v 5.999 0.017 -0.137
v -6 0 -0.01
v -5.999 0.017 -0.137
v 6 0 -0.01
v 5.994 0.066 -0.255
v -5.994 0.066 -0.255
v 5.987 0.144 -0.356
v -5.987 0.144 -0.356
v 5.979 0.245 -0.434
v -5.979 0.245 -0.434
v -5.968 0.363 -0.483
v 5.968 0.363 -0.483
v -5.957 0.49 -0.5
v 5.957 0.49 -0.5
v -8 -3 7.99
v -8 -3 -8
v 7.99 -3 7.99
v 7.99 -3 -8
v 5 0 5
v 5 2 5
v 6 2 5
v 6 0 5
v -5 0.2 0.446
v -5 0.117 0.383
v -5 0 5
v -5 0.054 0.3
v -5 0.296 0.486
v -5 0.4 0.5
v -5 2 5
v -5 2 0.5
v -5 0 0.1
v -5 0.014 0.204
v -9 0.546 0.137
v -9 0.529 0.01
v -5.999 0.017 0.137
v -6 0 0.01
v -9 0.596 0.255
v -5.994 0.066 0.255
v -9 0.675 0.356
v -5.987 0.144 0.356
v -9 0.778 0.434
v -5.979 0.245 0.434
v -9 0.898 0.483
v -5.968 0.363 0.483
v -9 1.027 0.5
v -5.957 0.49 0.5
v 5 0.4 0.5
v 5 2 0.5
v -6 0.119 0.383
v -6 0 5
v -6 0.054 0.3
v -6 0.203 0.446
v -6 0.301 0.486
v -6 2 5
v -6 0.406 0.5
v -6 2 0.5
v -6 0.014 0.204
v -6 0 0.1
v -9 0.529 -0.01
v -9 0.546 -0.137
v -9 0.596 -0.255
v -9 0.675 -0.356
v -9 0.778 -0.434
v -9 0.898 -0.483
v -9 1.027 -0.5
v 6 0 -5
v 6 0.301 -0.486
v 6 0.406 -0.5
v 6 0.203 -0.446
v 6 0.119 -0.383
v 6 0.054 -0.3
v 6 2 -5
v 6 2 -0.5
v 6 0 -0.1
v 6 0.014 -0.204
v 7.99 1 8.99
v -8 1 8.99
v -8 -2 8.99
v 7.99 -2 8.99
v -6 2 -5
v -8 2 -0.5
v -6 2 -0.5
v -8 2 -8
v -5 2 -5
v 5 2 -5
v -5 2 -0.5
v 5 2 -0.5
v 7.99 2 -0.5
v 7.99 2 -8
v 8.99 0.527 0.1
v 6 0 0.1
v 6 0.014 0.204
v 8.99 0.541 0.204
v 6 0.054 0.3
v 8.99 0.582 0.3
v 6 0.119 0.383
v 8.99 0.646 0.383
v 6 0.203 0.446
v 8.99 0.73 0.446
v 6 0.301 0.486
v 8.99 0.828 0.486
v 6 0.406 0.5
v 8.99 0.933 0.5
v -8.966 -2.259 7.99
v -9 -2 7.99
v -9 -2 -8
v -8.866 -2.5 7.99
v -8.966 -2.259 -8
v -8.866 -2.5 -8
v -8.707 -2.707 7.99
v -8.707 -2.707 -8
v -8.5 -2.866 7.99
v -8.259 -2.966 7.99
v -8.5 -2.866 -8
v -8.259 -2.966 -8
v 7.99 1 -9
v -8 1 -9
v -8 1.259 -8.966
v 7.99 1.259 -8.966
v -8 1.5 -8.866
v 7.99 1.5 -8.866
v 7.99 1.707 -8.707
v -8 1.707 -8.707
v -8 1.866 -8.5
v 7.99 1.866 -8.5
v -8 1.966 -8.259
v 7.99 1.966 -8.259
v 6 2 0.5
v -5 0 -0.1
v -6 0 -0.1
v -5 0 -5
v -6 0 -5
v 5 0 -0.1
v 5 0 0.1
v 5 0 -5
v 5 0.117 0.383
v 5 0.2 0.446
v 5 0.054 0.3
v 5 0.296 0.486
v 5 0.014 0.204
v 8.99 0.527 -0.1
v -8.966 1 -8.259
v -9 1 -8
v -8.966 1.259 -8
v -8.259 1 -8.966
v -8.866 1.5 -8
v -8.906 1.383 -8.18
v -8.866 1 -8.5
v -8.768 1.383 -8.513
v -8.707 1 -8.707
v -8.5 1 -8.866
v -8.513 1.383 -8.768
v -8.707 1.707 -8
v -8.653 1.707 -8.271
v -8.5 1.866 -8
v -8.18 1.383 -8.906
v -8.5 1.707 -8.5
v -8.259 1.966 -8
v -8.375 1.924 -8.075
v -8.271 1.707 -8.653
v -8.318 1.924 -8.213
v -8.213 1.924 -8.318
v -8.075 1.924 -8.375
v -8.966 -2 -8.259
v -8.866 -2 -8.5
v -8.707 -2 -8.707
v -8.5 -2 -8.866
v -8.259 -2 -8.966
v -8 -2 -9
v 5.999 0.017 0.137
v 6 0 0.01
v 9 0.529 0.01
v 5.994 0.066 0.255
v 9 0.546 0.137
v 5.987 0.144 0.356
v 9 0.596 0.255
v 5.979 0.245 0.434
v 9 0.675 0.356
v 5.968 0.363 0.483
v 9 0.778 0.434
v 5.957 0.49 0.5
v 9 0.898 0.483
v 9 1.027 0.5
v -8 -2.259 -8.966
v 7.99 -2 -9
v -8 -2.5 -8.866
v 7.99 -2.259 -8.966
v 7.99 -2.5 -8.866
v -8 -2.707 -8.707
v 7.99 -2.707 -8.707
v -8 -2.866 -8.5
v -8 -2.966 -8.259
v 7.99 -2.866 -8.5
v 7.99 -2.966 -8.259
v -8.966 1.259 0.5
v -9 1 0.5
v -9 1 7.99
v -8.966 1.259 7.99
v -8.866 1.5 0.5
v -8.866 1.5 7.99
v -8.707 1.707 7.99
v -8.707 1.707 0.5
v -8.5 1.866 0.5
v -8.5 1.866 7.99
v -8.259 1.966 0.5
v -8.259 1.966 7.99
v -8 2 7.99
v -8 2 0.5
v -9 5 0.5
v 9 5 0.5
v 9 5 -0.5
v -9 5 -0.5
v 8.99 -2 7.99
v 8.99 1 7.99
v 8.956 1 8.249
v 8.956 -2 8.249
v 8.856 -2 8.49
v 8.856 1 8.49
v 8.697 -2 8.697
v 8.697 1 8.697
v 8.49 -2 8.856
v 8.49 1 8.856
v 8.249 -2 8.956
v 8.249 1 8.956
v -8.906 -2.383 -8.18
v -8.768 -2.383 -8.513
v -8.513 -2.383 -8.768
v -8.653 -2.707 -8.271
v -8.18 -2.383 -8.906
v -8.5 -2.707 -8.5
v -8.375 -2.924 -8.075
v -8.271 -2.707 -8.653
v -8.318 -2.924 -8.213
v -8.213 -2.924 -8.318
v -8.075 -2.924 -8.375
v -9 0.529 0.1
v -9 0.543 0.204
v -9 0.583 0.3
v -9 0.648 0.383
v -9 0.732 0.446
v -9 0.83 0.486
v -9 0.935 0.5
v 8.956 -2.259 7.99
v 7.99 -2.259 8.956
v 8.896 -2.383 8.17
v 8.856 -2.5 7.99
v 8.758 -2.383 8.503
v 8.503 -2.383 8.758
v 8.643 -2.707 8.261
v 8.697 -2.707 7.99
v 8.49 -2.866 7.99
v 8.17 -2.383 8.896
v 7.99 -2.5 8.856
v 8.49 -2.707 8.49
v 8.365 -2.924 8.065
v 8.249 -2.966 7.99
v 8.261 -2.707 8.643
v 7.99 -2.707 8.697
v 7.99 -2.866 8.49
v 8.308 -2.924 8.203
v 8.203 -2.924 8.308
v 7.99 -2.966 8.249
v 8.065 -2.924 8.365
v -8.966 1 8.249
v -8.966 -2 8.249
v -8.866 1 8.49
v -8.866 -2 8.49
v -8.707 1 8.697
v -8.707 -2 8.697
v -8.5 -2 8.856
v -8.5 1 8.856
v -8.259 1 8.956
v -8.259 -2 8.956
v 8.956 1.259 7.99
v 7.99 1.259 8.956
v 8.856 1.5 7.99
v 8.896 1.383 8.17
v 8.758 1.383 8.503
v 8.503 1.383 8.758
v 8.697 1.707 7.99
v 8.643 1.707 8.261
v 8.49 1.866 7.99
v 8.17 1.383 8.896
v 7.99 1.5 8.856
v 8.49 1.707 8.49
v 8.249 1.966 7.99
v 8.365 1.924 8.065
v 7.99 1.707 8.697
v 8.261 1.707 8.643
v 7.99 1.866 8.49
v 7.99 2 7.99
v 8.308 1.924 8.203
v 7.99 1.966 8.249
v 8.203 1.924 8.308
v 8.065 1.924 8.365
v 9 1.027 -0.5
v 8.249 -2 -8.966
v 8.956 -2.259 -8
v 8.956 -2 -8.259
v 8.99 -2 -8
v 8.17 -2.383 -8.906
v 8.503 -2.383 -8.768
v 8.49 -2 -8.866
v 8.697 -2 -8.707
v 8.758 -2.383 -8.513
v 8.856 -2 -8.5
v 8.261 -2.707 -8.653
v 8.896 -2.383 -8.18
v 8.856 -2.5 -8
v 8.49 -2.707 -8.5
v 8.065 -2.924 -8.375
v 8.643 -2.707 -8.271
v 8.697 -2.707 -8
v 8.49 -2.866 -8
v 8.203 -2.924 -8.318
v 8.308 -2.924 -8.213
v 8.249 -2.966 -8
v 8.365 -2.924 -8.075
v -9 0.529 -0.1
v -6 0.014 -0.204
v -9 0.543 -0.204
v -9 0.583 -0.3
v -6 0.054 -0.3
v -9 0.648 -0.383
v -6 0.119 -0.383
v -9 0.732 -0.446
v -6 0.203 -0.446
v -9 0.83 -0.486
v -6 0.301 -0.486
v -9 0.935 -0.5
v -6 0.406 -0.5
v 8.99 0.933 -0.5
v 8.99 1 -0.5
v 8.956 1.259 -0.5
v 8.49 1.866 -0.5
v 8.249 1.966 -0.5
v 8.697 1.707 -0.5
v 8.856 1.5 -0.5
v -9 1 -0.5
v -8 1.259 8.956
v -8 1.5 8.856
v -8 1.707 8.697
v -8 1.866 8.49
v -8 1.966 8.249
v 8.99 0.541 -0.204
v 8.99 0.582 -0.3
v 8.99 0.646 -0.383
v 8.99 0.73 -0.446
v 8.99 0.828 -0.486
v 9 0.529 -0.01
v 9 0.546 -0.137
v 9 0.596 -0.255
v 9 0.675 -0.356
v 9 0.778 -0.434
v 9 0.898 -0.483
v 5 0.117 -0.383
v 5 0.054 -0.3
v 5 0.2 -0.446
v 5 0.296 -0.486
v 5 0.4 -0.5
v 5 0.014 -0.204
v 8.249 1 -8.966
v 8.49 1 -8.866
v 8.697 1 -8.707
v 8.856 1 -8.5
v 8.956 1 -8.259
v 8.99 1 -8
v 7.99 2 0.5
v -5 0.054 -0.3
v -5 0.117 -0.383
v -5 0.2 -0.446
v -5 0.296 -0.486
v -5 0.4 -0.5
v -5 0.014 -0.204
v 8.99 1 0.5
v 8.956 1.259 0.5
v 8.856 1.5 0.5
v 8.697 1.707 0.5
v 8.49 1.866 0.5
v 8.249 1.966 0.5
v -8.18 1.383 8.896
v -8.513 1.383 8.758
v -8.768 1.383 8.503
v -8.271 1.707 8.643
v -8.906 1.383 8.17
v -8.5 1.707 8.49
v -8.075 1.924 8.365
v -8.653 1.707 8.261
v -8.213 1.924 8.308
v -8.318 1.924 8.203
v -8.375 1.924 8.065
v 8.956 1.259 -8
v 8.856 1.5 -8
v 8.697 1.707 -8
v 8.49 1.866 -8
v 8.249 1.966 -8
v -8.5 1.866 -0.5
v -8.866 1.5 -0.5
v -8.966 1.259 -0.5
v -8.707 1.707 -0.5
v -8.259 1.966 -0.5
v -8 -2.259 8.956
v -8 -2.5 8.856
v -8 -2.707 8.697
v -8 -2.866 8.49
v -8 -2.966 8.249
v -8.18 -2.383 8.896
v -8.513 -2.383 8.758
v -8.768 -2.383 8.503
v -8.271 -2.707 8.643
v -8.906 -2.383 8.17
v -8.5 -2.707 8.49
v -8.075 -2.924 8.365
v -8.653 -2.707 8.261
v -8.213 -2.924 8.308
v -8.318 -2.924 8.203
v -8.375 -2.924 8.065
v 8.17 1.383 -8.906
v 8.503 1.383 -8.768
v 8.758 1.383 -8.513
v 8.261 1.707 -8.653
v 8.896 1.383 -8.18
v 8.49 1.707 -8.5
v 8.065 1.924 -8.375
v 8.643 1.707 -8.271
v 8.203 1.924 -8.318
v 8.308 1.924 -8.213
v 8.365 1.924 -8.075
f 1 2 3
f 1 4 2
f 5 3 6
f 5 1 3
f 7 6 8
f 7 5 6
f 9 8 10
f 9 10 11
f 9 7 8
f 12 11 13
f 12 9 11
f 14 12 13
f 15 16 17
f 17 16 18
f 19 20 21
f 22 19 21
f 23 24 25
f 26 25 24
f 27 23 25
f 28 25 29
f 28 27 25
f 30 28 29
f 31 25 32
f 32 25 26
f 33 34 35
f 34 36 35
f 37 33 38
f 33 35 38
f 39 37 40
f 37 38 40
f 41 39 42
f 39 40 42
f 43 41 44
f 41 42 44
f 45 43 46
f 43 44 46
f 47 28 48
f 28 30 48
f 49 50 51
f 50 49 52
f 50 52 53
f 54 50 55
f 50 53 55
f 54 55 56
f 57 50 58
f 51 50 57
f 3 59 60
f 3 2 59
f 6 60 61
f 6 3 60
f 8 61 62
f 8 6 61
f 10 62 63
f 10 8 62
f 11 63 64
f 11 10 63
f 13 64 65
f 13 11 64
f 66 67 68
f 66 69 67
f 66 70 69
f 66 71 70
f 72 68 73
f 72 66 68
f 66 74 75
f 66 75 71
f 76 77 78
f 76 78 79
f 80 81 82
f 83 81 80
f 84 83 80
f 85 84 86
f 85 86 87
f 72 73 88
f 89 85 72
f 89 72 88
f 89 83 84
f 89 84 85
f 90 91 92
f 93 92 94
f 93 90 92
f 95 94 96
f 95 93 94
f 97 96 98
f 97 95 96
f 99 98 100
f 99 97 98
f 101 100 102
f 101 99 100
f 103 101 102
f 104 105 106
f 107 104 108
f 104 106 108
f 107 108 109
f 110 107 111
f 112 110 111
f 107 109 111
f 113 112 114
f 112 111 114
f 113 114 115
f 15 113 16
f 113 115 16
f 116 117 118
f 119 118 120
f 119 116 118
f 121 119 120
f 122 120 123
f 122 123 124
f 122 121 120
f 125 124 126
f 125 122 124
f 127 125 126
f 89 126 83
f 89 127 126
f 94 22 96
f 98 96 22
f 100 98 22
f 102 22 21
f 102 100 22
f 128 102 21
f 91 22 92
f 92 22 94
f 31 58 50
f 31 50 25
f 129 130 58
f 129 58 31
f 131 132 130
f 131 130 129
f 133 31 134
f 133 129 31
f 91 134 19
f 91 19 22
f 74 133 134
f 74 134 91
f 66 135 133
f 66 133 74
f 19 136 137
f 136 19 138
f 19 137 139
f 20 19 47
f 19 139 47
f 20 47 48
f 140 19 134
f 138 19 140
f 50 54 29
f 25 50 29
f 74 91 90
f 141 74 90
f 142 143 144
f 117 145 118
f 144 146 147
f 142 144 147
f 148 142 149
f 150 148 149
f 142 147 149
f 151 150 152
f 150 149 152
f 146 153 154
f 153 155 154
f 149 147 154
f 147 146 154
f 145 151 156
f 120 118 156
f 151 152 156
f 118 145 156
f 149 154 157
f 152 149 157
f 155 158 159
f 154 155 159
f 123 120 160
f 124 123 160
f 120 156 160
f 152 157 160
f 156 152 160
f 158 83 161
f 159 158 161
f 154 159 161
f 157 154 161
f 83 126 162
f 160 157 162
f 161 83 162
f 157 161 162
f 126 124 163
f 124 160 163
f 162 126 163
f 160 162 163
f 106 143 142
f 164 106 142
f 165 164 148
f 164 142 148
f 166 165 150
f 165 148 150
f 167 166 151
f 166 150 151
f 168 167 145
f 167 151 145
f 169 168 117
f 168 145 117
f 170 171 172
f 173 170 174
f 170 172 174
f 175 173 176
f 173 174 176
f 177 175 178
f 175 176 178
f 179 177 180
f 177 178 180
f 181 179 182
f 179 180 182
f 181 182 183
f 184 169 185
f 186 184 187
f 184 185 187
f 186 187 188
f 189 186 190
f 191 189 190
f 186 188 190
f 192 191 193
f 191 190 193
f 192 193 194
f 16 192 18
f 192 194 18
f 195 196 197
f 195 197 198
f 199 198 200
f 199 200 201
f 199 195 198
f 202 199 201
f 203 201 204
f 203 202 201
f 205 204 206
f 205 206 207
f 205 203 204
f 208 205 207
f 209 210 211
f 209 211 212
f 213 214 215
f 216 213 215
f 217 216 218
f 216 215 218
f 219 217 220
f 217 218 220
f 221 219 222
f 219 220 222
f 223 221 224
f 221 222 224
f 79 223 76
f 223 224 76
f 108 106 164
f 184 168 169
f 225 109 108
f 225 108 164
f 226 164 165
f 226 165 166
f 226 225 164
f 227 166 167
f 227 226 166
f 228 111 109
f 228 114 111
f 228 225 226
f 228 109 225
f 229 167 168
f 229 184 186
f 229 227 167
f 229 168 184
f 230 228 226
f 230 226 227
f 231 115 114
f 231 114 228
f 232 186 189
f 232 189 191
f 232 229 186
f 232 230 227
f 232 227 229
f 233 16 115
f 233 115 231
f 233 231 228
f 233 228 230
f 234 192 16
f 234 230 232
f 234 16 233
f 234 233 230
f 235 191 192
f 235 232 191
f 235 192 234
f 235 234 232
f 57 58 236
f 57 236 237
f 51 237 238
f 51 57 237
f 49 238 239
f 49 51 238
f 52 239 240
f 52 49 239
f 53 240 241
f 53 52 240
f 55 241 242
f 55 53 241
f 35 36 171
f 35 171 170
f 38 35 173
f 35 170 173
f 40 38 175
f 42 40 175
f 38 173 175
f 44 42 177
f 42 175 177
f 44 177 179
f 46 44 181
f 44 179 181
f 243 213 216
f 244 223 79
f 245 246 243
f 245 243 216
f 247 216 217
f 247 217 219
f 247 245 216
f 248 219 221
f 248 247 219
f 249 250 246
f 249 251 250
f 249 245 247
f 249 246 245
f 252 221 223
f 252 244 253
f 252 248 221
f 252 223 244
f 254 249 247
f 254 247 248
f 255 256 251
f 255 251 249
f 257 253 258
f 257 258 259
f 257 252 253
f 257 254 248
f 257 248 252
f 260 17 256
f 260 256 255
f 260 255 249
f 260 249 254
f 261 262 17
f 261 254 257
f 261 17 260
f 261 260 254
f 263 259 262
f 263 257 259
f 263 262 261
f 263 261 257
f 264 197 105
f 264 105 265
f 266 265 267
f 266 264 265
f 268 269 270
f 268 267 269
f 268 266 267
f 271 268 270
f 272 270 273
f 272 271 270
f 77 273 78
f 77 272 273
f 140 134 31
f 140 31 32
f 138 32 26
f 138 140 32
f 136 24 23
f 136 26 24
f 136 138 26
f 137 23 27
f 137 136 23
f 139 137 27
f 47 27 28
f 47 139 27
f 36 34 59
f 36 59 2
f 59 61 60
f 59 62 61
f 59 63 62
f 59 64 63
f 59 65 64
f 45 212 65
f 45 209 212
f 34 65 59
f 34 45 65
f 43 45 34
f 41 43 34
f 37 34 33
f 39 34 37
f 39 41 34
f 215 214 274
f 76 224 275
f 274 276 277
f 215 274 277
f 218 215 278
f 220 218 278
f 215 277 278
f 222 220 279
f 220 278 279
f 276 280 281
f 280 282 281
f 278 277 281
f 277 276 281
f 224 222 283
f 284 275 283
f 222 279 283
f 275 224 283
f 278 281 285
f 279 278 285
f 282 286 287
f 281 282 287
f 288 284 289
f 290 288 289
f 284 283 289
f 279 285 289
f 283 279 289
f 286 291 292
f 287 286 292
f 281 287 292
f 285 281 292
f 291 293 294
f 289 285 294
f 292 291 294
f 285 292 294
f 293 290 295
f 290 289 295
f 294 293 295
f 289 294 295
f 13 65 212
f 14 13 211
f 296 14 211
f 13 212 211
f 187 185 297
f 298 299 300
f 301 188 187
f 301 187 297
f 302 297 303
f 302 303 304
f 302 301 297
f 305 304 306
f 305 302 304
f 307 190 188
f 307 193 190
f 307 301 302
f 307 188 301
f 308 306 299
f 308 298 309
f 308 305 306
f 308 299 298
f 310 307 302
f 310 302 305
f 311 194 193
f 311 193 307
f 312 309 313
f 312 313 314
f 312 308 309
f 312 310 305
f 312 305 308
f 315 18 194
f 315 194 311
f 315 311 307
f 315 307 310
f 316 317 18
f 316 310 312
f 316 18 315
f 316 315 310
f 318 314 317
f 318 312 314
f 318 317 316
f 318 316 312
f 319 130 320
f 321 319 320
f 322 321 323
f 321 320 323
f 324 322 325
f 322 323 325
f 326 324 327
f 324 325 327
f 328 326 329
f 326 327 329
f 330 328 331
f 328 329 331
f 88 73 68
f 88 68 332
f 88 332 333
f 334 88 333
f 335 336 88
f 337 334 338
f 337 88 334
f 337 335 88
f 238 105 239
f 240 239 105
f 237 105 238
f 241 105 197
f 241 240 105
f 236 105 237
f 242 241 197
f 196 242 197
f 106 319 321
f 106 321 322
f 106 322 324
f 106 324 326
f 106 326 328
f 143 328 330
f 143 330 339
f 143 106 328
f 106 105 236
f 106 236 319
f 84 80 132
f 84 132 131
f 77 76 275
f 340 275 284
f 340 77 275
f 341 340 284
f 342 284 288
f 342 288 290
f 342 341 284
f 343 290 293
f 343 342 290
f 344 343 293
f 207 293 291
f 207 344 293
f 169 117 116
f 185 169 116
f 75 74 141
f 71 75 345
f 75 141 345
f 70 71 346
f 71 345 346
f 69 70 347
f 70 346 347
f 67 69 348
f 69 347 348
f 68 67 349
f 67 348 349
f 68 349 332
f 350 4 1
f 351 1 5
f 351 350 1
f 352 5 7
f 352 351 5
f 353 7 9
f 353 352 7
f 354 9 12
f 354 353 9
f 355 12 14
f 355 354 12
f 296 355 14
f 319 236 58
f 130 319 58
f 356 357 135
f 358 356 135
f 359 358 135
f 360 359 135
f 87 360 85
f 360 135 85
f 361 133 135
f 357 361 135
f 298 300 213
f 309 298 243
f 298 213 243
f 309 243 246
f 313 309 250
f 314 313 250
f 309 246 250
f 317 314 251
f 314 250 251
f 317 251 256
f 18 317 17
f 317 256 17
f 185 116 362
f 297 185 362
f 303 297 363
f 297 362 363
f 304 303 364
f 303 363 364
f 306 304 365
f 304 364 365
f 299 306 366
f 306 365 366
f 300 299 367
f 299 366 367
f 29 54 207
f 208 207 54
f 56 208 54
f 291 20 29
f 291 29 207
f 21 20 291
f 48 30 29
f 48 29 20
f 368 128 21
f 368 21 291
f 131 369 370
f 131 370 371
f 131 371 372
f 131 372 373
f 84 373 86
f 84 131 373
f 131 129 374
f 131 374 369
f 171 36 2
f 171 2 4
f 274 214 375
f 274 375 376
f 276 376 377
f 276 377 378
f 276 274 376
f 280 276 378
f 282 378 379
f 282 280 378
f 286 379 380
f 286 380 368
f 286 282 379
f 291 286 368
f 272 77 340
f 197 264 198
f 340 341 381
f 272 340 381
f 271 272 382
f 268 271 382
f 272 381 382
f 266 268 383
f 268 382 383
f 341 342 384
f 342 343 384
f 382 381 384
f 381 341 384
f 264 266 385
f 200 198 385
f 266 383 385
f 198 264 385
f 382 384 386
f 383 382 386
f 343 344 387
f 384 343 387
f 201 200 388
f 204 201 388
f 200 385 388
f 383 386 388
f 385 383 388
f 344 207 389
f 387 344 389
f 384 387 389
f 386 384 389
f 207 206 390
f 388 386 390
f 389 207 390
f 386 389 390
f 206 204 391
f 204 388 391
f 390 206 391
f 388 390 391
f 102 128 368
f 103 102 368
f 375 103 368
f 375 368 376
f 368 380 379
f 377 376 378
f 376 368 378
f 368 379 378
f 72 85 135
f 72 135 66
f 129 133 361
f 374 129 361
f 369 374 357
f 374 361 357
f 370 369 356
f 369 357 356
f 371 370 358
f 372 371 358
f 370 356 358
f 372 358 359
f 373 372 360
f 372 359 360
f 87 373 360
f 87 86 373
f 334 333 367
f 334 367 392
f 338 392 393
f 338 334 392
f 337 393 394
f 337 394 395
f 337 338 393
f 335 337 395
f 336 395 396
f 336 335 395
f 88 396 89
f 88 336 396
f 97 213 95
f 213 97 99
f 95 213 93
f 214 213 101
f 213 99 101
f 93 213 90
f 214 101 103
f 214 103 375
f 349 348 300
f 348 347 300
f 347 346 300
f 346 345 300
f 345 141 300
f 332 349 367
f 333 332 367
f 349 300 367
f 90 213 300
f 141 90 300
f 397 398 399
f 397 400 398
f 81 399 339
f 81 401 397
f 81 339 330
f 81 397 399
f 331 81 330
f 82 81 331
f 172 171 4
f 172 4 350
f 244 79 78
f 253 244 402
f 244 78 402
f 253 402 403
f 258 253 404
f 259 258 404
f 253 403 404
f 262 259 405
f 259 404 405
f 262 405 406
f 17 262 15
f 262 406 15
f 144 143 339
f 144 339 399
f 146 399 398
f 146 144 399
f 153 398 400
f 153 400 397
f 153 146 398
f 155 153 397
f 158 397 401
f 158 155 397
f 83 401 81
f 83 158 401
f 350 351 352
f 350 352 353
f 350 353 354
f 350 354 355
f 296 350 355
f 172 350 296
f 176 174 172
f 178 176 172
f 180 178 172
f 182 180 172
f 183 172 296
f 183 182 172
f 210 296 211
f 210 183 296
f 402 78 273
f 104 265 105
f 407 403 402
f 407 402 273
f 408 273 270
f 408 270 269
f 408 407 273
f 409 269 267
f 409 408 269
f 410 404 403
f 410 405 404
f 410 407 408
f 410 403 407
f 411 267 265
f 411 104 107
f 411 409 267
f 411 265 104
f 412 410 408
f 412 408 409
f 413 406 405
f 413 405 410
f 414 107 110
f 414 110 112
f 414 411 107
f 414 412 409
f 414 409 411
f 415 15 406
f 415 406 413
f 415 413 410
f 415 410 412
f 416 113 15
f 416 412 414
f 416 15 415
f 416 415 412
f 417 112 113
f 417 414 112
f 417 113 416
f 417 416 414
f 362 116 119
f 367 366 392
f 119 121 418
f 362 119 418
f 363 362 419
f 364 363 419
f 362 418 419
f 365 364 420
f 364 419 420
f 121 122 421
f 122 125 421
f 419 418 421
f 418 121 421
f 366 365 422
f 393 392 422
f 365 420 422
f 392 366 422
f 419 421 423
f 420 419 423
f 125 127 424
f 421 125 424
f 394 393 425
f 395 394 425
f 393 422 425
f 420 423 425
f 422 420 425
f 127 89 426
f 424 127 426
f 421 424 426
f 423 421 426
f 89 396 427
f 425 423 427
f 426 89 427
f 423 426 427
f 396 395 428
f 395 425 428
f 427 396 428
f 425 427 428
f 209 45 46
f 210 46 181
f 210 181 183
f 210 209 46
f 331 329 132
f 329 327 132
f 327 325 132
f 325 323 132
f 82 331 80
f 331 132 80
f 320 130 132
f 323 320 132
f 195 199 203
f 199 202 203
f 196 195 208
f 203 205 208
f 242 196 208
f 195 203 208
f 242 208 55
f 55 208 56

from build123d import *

# Parameters (mm, degrees)
PAD_DEPTH    = 0.5
FILLET006_R  = 0.49
BOX001_W     = 1
BOX001_H     = 5
BOX001_DEPTH = 10
FILLET_R     = 0.4
BOX002_W     = 1
BOX002_H     = 5
BOX002_DEPTH = 10
BOX_W        = 17.99
BOX_H        = 5
BOX_DEPTH    = 17.99
FILLET002_R  = 1
FILLET003_R  = 1
FILLET004_R  = 1
FILLET005_R  = 1


with BuildPart() as pad:
    # Sketch → Pad (new body, symmetric)
    with BuildSketch(Plane.XY):
        Polygon((9, 0.528981), (9, 5), (-9, 5), (-9, 0.528981), (-6, 0), (6, 0), align=None)
    extrude(amount=PAD_DEPTH, both=True)


with BuildPart() as fillet006:
    # Fillet006 base: copy of Pad
    add(pad.part)

    # Fillet006
    fillet006_edges = [fillet006.edges().sort_by_distance(p)[0] for p in [
        (-7.5, 0.26449, -0.5),
        (-7.5, 0.26449, 0.5),
        (0, 0, 0.5),
        (0, 0, -0.5),
        (7.5, 0.26449, 0.5),
        (7.5, 0.26449, -0.5),
    ]]
    fillet(fillet006_edges, radius=FILLET006_R)


with BuildPart() as cube001:
    # Box001 → Box001 (new body)
    with BuildSketch(Plane(origin=(-6, 0, -5), x_dir=(1, 0, 0), z_dir=(0, 0, 1))):
        with Locations((0.5, 2.5)):
            Rectangle(BOX001_W, BOX001_H)
    extrude(amount=BOX001_DEPTH)


with BuildPart() as fillet_body:
    # Fillet base: copy of Pad
    add(pad.part)

    # Fillet
    fillet_edges = [fillet_body.edges().sort_by_distance(p)[0] for p in [
        (-7.5, 0.26449, 0.5),
        (-7.5, 0.26449, -0.5),
        (0, 0, 0.5),
        (0, 0, -0.5),
        (7.5, 0.26449, 0.5),
        (7.5, 0.26449, -0.5),
    ]]
    fillet(fillet_edges, radius=FILLET_R)


with BuildPart() as fusion:
    # Box002 → Box002 (new body)
    with BuildSketch(Plane(origin=(5, 0, -5), x_dir=(1, 0, 0), z_dir=(0, 0, 1))):
        with Locations((0.5, 2.5)):
            Rectangle(BOX002_W, BOX002_H)
    extrude(amount=BOX002_DEPTH)

    # Fusion: union Cube001, Fillet body
    add(cube001.part)
    add(fillet_body.part)


with BuildPart() as cut:
    # Box → Box (new body)
    with BuildSketch(Plane(origin=(-9, -3, -9), x_dir=(1, 0, 0), z_dir=(0, 0, 1))):
        with Locations((8.995, 2.5)):
            Rectangle(BOX_W, BOX_H)
    extrude(amount=BOX_DEPTH)

    # Fillet002
    fillet002_edges = [cut.edges().sort_by_distance(p)[0] for p in [
        (-9, -0.5, -9),
        (-9, -0.5, 8.99),
        (8.99, -0.5, 8.99),
    ]]
    fillet(fillet002_edges, radius=FILLET002_R)

    # Fillet003
    fillet003_edges = [cut.edges().sort_by_distance(p)[0] for p in [
        (8.99, -0.5, -9),
    ]]
    fillet(fillet003_edges, radius=FILLET003_R)

    # Fillet004
    fillet004_edges = [cut.edges().sort_by_distance(p)[0] for p in [
        (-0.005, 2, -9),
        (8.697107, 2, -8.707107),
        (-8.707107, 2, -8.707107),
        (8.99, 2, -0.005),
        (-9, 2, -0.005),
        (8.697107, 2, 8.697107),
        (-8.707107, 2, 8.697107),
        (-0.005, 2, 8.99),
    ]]
    fillet(fillet004_edges, radius=FILLET004_R)

    # Fillet005
    fillet005_edges = [cut.edges().sort_by_distance(p)[0] for p in [
        (-0.005, -3, -9),
        (8.697107, -3, -8.707107),
        (-8.707107, -3, -8.707107),
        (8.99, -3, -0.005),
        (-9, -3, -0.005),
        (8.697107, -3, 8.697107),
        (-8.707107, -3, 8.697107),
        (-0.005, -3, 8.99),
    ]]
    fillet(fillet005_edges, radius=FILLET005_R)

    # Cut: cut Fusion
    add(fusion.part, mode=Mode.SUBTRACT)


solid = Compound([fillet006.part, cut.part])
